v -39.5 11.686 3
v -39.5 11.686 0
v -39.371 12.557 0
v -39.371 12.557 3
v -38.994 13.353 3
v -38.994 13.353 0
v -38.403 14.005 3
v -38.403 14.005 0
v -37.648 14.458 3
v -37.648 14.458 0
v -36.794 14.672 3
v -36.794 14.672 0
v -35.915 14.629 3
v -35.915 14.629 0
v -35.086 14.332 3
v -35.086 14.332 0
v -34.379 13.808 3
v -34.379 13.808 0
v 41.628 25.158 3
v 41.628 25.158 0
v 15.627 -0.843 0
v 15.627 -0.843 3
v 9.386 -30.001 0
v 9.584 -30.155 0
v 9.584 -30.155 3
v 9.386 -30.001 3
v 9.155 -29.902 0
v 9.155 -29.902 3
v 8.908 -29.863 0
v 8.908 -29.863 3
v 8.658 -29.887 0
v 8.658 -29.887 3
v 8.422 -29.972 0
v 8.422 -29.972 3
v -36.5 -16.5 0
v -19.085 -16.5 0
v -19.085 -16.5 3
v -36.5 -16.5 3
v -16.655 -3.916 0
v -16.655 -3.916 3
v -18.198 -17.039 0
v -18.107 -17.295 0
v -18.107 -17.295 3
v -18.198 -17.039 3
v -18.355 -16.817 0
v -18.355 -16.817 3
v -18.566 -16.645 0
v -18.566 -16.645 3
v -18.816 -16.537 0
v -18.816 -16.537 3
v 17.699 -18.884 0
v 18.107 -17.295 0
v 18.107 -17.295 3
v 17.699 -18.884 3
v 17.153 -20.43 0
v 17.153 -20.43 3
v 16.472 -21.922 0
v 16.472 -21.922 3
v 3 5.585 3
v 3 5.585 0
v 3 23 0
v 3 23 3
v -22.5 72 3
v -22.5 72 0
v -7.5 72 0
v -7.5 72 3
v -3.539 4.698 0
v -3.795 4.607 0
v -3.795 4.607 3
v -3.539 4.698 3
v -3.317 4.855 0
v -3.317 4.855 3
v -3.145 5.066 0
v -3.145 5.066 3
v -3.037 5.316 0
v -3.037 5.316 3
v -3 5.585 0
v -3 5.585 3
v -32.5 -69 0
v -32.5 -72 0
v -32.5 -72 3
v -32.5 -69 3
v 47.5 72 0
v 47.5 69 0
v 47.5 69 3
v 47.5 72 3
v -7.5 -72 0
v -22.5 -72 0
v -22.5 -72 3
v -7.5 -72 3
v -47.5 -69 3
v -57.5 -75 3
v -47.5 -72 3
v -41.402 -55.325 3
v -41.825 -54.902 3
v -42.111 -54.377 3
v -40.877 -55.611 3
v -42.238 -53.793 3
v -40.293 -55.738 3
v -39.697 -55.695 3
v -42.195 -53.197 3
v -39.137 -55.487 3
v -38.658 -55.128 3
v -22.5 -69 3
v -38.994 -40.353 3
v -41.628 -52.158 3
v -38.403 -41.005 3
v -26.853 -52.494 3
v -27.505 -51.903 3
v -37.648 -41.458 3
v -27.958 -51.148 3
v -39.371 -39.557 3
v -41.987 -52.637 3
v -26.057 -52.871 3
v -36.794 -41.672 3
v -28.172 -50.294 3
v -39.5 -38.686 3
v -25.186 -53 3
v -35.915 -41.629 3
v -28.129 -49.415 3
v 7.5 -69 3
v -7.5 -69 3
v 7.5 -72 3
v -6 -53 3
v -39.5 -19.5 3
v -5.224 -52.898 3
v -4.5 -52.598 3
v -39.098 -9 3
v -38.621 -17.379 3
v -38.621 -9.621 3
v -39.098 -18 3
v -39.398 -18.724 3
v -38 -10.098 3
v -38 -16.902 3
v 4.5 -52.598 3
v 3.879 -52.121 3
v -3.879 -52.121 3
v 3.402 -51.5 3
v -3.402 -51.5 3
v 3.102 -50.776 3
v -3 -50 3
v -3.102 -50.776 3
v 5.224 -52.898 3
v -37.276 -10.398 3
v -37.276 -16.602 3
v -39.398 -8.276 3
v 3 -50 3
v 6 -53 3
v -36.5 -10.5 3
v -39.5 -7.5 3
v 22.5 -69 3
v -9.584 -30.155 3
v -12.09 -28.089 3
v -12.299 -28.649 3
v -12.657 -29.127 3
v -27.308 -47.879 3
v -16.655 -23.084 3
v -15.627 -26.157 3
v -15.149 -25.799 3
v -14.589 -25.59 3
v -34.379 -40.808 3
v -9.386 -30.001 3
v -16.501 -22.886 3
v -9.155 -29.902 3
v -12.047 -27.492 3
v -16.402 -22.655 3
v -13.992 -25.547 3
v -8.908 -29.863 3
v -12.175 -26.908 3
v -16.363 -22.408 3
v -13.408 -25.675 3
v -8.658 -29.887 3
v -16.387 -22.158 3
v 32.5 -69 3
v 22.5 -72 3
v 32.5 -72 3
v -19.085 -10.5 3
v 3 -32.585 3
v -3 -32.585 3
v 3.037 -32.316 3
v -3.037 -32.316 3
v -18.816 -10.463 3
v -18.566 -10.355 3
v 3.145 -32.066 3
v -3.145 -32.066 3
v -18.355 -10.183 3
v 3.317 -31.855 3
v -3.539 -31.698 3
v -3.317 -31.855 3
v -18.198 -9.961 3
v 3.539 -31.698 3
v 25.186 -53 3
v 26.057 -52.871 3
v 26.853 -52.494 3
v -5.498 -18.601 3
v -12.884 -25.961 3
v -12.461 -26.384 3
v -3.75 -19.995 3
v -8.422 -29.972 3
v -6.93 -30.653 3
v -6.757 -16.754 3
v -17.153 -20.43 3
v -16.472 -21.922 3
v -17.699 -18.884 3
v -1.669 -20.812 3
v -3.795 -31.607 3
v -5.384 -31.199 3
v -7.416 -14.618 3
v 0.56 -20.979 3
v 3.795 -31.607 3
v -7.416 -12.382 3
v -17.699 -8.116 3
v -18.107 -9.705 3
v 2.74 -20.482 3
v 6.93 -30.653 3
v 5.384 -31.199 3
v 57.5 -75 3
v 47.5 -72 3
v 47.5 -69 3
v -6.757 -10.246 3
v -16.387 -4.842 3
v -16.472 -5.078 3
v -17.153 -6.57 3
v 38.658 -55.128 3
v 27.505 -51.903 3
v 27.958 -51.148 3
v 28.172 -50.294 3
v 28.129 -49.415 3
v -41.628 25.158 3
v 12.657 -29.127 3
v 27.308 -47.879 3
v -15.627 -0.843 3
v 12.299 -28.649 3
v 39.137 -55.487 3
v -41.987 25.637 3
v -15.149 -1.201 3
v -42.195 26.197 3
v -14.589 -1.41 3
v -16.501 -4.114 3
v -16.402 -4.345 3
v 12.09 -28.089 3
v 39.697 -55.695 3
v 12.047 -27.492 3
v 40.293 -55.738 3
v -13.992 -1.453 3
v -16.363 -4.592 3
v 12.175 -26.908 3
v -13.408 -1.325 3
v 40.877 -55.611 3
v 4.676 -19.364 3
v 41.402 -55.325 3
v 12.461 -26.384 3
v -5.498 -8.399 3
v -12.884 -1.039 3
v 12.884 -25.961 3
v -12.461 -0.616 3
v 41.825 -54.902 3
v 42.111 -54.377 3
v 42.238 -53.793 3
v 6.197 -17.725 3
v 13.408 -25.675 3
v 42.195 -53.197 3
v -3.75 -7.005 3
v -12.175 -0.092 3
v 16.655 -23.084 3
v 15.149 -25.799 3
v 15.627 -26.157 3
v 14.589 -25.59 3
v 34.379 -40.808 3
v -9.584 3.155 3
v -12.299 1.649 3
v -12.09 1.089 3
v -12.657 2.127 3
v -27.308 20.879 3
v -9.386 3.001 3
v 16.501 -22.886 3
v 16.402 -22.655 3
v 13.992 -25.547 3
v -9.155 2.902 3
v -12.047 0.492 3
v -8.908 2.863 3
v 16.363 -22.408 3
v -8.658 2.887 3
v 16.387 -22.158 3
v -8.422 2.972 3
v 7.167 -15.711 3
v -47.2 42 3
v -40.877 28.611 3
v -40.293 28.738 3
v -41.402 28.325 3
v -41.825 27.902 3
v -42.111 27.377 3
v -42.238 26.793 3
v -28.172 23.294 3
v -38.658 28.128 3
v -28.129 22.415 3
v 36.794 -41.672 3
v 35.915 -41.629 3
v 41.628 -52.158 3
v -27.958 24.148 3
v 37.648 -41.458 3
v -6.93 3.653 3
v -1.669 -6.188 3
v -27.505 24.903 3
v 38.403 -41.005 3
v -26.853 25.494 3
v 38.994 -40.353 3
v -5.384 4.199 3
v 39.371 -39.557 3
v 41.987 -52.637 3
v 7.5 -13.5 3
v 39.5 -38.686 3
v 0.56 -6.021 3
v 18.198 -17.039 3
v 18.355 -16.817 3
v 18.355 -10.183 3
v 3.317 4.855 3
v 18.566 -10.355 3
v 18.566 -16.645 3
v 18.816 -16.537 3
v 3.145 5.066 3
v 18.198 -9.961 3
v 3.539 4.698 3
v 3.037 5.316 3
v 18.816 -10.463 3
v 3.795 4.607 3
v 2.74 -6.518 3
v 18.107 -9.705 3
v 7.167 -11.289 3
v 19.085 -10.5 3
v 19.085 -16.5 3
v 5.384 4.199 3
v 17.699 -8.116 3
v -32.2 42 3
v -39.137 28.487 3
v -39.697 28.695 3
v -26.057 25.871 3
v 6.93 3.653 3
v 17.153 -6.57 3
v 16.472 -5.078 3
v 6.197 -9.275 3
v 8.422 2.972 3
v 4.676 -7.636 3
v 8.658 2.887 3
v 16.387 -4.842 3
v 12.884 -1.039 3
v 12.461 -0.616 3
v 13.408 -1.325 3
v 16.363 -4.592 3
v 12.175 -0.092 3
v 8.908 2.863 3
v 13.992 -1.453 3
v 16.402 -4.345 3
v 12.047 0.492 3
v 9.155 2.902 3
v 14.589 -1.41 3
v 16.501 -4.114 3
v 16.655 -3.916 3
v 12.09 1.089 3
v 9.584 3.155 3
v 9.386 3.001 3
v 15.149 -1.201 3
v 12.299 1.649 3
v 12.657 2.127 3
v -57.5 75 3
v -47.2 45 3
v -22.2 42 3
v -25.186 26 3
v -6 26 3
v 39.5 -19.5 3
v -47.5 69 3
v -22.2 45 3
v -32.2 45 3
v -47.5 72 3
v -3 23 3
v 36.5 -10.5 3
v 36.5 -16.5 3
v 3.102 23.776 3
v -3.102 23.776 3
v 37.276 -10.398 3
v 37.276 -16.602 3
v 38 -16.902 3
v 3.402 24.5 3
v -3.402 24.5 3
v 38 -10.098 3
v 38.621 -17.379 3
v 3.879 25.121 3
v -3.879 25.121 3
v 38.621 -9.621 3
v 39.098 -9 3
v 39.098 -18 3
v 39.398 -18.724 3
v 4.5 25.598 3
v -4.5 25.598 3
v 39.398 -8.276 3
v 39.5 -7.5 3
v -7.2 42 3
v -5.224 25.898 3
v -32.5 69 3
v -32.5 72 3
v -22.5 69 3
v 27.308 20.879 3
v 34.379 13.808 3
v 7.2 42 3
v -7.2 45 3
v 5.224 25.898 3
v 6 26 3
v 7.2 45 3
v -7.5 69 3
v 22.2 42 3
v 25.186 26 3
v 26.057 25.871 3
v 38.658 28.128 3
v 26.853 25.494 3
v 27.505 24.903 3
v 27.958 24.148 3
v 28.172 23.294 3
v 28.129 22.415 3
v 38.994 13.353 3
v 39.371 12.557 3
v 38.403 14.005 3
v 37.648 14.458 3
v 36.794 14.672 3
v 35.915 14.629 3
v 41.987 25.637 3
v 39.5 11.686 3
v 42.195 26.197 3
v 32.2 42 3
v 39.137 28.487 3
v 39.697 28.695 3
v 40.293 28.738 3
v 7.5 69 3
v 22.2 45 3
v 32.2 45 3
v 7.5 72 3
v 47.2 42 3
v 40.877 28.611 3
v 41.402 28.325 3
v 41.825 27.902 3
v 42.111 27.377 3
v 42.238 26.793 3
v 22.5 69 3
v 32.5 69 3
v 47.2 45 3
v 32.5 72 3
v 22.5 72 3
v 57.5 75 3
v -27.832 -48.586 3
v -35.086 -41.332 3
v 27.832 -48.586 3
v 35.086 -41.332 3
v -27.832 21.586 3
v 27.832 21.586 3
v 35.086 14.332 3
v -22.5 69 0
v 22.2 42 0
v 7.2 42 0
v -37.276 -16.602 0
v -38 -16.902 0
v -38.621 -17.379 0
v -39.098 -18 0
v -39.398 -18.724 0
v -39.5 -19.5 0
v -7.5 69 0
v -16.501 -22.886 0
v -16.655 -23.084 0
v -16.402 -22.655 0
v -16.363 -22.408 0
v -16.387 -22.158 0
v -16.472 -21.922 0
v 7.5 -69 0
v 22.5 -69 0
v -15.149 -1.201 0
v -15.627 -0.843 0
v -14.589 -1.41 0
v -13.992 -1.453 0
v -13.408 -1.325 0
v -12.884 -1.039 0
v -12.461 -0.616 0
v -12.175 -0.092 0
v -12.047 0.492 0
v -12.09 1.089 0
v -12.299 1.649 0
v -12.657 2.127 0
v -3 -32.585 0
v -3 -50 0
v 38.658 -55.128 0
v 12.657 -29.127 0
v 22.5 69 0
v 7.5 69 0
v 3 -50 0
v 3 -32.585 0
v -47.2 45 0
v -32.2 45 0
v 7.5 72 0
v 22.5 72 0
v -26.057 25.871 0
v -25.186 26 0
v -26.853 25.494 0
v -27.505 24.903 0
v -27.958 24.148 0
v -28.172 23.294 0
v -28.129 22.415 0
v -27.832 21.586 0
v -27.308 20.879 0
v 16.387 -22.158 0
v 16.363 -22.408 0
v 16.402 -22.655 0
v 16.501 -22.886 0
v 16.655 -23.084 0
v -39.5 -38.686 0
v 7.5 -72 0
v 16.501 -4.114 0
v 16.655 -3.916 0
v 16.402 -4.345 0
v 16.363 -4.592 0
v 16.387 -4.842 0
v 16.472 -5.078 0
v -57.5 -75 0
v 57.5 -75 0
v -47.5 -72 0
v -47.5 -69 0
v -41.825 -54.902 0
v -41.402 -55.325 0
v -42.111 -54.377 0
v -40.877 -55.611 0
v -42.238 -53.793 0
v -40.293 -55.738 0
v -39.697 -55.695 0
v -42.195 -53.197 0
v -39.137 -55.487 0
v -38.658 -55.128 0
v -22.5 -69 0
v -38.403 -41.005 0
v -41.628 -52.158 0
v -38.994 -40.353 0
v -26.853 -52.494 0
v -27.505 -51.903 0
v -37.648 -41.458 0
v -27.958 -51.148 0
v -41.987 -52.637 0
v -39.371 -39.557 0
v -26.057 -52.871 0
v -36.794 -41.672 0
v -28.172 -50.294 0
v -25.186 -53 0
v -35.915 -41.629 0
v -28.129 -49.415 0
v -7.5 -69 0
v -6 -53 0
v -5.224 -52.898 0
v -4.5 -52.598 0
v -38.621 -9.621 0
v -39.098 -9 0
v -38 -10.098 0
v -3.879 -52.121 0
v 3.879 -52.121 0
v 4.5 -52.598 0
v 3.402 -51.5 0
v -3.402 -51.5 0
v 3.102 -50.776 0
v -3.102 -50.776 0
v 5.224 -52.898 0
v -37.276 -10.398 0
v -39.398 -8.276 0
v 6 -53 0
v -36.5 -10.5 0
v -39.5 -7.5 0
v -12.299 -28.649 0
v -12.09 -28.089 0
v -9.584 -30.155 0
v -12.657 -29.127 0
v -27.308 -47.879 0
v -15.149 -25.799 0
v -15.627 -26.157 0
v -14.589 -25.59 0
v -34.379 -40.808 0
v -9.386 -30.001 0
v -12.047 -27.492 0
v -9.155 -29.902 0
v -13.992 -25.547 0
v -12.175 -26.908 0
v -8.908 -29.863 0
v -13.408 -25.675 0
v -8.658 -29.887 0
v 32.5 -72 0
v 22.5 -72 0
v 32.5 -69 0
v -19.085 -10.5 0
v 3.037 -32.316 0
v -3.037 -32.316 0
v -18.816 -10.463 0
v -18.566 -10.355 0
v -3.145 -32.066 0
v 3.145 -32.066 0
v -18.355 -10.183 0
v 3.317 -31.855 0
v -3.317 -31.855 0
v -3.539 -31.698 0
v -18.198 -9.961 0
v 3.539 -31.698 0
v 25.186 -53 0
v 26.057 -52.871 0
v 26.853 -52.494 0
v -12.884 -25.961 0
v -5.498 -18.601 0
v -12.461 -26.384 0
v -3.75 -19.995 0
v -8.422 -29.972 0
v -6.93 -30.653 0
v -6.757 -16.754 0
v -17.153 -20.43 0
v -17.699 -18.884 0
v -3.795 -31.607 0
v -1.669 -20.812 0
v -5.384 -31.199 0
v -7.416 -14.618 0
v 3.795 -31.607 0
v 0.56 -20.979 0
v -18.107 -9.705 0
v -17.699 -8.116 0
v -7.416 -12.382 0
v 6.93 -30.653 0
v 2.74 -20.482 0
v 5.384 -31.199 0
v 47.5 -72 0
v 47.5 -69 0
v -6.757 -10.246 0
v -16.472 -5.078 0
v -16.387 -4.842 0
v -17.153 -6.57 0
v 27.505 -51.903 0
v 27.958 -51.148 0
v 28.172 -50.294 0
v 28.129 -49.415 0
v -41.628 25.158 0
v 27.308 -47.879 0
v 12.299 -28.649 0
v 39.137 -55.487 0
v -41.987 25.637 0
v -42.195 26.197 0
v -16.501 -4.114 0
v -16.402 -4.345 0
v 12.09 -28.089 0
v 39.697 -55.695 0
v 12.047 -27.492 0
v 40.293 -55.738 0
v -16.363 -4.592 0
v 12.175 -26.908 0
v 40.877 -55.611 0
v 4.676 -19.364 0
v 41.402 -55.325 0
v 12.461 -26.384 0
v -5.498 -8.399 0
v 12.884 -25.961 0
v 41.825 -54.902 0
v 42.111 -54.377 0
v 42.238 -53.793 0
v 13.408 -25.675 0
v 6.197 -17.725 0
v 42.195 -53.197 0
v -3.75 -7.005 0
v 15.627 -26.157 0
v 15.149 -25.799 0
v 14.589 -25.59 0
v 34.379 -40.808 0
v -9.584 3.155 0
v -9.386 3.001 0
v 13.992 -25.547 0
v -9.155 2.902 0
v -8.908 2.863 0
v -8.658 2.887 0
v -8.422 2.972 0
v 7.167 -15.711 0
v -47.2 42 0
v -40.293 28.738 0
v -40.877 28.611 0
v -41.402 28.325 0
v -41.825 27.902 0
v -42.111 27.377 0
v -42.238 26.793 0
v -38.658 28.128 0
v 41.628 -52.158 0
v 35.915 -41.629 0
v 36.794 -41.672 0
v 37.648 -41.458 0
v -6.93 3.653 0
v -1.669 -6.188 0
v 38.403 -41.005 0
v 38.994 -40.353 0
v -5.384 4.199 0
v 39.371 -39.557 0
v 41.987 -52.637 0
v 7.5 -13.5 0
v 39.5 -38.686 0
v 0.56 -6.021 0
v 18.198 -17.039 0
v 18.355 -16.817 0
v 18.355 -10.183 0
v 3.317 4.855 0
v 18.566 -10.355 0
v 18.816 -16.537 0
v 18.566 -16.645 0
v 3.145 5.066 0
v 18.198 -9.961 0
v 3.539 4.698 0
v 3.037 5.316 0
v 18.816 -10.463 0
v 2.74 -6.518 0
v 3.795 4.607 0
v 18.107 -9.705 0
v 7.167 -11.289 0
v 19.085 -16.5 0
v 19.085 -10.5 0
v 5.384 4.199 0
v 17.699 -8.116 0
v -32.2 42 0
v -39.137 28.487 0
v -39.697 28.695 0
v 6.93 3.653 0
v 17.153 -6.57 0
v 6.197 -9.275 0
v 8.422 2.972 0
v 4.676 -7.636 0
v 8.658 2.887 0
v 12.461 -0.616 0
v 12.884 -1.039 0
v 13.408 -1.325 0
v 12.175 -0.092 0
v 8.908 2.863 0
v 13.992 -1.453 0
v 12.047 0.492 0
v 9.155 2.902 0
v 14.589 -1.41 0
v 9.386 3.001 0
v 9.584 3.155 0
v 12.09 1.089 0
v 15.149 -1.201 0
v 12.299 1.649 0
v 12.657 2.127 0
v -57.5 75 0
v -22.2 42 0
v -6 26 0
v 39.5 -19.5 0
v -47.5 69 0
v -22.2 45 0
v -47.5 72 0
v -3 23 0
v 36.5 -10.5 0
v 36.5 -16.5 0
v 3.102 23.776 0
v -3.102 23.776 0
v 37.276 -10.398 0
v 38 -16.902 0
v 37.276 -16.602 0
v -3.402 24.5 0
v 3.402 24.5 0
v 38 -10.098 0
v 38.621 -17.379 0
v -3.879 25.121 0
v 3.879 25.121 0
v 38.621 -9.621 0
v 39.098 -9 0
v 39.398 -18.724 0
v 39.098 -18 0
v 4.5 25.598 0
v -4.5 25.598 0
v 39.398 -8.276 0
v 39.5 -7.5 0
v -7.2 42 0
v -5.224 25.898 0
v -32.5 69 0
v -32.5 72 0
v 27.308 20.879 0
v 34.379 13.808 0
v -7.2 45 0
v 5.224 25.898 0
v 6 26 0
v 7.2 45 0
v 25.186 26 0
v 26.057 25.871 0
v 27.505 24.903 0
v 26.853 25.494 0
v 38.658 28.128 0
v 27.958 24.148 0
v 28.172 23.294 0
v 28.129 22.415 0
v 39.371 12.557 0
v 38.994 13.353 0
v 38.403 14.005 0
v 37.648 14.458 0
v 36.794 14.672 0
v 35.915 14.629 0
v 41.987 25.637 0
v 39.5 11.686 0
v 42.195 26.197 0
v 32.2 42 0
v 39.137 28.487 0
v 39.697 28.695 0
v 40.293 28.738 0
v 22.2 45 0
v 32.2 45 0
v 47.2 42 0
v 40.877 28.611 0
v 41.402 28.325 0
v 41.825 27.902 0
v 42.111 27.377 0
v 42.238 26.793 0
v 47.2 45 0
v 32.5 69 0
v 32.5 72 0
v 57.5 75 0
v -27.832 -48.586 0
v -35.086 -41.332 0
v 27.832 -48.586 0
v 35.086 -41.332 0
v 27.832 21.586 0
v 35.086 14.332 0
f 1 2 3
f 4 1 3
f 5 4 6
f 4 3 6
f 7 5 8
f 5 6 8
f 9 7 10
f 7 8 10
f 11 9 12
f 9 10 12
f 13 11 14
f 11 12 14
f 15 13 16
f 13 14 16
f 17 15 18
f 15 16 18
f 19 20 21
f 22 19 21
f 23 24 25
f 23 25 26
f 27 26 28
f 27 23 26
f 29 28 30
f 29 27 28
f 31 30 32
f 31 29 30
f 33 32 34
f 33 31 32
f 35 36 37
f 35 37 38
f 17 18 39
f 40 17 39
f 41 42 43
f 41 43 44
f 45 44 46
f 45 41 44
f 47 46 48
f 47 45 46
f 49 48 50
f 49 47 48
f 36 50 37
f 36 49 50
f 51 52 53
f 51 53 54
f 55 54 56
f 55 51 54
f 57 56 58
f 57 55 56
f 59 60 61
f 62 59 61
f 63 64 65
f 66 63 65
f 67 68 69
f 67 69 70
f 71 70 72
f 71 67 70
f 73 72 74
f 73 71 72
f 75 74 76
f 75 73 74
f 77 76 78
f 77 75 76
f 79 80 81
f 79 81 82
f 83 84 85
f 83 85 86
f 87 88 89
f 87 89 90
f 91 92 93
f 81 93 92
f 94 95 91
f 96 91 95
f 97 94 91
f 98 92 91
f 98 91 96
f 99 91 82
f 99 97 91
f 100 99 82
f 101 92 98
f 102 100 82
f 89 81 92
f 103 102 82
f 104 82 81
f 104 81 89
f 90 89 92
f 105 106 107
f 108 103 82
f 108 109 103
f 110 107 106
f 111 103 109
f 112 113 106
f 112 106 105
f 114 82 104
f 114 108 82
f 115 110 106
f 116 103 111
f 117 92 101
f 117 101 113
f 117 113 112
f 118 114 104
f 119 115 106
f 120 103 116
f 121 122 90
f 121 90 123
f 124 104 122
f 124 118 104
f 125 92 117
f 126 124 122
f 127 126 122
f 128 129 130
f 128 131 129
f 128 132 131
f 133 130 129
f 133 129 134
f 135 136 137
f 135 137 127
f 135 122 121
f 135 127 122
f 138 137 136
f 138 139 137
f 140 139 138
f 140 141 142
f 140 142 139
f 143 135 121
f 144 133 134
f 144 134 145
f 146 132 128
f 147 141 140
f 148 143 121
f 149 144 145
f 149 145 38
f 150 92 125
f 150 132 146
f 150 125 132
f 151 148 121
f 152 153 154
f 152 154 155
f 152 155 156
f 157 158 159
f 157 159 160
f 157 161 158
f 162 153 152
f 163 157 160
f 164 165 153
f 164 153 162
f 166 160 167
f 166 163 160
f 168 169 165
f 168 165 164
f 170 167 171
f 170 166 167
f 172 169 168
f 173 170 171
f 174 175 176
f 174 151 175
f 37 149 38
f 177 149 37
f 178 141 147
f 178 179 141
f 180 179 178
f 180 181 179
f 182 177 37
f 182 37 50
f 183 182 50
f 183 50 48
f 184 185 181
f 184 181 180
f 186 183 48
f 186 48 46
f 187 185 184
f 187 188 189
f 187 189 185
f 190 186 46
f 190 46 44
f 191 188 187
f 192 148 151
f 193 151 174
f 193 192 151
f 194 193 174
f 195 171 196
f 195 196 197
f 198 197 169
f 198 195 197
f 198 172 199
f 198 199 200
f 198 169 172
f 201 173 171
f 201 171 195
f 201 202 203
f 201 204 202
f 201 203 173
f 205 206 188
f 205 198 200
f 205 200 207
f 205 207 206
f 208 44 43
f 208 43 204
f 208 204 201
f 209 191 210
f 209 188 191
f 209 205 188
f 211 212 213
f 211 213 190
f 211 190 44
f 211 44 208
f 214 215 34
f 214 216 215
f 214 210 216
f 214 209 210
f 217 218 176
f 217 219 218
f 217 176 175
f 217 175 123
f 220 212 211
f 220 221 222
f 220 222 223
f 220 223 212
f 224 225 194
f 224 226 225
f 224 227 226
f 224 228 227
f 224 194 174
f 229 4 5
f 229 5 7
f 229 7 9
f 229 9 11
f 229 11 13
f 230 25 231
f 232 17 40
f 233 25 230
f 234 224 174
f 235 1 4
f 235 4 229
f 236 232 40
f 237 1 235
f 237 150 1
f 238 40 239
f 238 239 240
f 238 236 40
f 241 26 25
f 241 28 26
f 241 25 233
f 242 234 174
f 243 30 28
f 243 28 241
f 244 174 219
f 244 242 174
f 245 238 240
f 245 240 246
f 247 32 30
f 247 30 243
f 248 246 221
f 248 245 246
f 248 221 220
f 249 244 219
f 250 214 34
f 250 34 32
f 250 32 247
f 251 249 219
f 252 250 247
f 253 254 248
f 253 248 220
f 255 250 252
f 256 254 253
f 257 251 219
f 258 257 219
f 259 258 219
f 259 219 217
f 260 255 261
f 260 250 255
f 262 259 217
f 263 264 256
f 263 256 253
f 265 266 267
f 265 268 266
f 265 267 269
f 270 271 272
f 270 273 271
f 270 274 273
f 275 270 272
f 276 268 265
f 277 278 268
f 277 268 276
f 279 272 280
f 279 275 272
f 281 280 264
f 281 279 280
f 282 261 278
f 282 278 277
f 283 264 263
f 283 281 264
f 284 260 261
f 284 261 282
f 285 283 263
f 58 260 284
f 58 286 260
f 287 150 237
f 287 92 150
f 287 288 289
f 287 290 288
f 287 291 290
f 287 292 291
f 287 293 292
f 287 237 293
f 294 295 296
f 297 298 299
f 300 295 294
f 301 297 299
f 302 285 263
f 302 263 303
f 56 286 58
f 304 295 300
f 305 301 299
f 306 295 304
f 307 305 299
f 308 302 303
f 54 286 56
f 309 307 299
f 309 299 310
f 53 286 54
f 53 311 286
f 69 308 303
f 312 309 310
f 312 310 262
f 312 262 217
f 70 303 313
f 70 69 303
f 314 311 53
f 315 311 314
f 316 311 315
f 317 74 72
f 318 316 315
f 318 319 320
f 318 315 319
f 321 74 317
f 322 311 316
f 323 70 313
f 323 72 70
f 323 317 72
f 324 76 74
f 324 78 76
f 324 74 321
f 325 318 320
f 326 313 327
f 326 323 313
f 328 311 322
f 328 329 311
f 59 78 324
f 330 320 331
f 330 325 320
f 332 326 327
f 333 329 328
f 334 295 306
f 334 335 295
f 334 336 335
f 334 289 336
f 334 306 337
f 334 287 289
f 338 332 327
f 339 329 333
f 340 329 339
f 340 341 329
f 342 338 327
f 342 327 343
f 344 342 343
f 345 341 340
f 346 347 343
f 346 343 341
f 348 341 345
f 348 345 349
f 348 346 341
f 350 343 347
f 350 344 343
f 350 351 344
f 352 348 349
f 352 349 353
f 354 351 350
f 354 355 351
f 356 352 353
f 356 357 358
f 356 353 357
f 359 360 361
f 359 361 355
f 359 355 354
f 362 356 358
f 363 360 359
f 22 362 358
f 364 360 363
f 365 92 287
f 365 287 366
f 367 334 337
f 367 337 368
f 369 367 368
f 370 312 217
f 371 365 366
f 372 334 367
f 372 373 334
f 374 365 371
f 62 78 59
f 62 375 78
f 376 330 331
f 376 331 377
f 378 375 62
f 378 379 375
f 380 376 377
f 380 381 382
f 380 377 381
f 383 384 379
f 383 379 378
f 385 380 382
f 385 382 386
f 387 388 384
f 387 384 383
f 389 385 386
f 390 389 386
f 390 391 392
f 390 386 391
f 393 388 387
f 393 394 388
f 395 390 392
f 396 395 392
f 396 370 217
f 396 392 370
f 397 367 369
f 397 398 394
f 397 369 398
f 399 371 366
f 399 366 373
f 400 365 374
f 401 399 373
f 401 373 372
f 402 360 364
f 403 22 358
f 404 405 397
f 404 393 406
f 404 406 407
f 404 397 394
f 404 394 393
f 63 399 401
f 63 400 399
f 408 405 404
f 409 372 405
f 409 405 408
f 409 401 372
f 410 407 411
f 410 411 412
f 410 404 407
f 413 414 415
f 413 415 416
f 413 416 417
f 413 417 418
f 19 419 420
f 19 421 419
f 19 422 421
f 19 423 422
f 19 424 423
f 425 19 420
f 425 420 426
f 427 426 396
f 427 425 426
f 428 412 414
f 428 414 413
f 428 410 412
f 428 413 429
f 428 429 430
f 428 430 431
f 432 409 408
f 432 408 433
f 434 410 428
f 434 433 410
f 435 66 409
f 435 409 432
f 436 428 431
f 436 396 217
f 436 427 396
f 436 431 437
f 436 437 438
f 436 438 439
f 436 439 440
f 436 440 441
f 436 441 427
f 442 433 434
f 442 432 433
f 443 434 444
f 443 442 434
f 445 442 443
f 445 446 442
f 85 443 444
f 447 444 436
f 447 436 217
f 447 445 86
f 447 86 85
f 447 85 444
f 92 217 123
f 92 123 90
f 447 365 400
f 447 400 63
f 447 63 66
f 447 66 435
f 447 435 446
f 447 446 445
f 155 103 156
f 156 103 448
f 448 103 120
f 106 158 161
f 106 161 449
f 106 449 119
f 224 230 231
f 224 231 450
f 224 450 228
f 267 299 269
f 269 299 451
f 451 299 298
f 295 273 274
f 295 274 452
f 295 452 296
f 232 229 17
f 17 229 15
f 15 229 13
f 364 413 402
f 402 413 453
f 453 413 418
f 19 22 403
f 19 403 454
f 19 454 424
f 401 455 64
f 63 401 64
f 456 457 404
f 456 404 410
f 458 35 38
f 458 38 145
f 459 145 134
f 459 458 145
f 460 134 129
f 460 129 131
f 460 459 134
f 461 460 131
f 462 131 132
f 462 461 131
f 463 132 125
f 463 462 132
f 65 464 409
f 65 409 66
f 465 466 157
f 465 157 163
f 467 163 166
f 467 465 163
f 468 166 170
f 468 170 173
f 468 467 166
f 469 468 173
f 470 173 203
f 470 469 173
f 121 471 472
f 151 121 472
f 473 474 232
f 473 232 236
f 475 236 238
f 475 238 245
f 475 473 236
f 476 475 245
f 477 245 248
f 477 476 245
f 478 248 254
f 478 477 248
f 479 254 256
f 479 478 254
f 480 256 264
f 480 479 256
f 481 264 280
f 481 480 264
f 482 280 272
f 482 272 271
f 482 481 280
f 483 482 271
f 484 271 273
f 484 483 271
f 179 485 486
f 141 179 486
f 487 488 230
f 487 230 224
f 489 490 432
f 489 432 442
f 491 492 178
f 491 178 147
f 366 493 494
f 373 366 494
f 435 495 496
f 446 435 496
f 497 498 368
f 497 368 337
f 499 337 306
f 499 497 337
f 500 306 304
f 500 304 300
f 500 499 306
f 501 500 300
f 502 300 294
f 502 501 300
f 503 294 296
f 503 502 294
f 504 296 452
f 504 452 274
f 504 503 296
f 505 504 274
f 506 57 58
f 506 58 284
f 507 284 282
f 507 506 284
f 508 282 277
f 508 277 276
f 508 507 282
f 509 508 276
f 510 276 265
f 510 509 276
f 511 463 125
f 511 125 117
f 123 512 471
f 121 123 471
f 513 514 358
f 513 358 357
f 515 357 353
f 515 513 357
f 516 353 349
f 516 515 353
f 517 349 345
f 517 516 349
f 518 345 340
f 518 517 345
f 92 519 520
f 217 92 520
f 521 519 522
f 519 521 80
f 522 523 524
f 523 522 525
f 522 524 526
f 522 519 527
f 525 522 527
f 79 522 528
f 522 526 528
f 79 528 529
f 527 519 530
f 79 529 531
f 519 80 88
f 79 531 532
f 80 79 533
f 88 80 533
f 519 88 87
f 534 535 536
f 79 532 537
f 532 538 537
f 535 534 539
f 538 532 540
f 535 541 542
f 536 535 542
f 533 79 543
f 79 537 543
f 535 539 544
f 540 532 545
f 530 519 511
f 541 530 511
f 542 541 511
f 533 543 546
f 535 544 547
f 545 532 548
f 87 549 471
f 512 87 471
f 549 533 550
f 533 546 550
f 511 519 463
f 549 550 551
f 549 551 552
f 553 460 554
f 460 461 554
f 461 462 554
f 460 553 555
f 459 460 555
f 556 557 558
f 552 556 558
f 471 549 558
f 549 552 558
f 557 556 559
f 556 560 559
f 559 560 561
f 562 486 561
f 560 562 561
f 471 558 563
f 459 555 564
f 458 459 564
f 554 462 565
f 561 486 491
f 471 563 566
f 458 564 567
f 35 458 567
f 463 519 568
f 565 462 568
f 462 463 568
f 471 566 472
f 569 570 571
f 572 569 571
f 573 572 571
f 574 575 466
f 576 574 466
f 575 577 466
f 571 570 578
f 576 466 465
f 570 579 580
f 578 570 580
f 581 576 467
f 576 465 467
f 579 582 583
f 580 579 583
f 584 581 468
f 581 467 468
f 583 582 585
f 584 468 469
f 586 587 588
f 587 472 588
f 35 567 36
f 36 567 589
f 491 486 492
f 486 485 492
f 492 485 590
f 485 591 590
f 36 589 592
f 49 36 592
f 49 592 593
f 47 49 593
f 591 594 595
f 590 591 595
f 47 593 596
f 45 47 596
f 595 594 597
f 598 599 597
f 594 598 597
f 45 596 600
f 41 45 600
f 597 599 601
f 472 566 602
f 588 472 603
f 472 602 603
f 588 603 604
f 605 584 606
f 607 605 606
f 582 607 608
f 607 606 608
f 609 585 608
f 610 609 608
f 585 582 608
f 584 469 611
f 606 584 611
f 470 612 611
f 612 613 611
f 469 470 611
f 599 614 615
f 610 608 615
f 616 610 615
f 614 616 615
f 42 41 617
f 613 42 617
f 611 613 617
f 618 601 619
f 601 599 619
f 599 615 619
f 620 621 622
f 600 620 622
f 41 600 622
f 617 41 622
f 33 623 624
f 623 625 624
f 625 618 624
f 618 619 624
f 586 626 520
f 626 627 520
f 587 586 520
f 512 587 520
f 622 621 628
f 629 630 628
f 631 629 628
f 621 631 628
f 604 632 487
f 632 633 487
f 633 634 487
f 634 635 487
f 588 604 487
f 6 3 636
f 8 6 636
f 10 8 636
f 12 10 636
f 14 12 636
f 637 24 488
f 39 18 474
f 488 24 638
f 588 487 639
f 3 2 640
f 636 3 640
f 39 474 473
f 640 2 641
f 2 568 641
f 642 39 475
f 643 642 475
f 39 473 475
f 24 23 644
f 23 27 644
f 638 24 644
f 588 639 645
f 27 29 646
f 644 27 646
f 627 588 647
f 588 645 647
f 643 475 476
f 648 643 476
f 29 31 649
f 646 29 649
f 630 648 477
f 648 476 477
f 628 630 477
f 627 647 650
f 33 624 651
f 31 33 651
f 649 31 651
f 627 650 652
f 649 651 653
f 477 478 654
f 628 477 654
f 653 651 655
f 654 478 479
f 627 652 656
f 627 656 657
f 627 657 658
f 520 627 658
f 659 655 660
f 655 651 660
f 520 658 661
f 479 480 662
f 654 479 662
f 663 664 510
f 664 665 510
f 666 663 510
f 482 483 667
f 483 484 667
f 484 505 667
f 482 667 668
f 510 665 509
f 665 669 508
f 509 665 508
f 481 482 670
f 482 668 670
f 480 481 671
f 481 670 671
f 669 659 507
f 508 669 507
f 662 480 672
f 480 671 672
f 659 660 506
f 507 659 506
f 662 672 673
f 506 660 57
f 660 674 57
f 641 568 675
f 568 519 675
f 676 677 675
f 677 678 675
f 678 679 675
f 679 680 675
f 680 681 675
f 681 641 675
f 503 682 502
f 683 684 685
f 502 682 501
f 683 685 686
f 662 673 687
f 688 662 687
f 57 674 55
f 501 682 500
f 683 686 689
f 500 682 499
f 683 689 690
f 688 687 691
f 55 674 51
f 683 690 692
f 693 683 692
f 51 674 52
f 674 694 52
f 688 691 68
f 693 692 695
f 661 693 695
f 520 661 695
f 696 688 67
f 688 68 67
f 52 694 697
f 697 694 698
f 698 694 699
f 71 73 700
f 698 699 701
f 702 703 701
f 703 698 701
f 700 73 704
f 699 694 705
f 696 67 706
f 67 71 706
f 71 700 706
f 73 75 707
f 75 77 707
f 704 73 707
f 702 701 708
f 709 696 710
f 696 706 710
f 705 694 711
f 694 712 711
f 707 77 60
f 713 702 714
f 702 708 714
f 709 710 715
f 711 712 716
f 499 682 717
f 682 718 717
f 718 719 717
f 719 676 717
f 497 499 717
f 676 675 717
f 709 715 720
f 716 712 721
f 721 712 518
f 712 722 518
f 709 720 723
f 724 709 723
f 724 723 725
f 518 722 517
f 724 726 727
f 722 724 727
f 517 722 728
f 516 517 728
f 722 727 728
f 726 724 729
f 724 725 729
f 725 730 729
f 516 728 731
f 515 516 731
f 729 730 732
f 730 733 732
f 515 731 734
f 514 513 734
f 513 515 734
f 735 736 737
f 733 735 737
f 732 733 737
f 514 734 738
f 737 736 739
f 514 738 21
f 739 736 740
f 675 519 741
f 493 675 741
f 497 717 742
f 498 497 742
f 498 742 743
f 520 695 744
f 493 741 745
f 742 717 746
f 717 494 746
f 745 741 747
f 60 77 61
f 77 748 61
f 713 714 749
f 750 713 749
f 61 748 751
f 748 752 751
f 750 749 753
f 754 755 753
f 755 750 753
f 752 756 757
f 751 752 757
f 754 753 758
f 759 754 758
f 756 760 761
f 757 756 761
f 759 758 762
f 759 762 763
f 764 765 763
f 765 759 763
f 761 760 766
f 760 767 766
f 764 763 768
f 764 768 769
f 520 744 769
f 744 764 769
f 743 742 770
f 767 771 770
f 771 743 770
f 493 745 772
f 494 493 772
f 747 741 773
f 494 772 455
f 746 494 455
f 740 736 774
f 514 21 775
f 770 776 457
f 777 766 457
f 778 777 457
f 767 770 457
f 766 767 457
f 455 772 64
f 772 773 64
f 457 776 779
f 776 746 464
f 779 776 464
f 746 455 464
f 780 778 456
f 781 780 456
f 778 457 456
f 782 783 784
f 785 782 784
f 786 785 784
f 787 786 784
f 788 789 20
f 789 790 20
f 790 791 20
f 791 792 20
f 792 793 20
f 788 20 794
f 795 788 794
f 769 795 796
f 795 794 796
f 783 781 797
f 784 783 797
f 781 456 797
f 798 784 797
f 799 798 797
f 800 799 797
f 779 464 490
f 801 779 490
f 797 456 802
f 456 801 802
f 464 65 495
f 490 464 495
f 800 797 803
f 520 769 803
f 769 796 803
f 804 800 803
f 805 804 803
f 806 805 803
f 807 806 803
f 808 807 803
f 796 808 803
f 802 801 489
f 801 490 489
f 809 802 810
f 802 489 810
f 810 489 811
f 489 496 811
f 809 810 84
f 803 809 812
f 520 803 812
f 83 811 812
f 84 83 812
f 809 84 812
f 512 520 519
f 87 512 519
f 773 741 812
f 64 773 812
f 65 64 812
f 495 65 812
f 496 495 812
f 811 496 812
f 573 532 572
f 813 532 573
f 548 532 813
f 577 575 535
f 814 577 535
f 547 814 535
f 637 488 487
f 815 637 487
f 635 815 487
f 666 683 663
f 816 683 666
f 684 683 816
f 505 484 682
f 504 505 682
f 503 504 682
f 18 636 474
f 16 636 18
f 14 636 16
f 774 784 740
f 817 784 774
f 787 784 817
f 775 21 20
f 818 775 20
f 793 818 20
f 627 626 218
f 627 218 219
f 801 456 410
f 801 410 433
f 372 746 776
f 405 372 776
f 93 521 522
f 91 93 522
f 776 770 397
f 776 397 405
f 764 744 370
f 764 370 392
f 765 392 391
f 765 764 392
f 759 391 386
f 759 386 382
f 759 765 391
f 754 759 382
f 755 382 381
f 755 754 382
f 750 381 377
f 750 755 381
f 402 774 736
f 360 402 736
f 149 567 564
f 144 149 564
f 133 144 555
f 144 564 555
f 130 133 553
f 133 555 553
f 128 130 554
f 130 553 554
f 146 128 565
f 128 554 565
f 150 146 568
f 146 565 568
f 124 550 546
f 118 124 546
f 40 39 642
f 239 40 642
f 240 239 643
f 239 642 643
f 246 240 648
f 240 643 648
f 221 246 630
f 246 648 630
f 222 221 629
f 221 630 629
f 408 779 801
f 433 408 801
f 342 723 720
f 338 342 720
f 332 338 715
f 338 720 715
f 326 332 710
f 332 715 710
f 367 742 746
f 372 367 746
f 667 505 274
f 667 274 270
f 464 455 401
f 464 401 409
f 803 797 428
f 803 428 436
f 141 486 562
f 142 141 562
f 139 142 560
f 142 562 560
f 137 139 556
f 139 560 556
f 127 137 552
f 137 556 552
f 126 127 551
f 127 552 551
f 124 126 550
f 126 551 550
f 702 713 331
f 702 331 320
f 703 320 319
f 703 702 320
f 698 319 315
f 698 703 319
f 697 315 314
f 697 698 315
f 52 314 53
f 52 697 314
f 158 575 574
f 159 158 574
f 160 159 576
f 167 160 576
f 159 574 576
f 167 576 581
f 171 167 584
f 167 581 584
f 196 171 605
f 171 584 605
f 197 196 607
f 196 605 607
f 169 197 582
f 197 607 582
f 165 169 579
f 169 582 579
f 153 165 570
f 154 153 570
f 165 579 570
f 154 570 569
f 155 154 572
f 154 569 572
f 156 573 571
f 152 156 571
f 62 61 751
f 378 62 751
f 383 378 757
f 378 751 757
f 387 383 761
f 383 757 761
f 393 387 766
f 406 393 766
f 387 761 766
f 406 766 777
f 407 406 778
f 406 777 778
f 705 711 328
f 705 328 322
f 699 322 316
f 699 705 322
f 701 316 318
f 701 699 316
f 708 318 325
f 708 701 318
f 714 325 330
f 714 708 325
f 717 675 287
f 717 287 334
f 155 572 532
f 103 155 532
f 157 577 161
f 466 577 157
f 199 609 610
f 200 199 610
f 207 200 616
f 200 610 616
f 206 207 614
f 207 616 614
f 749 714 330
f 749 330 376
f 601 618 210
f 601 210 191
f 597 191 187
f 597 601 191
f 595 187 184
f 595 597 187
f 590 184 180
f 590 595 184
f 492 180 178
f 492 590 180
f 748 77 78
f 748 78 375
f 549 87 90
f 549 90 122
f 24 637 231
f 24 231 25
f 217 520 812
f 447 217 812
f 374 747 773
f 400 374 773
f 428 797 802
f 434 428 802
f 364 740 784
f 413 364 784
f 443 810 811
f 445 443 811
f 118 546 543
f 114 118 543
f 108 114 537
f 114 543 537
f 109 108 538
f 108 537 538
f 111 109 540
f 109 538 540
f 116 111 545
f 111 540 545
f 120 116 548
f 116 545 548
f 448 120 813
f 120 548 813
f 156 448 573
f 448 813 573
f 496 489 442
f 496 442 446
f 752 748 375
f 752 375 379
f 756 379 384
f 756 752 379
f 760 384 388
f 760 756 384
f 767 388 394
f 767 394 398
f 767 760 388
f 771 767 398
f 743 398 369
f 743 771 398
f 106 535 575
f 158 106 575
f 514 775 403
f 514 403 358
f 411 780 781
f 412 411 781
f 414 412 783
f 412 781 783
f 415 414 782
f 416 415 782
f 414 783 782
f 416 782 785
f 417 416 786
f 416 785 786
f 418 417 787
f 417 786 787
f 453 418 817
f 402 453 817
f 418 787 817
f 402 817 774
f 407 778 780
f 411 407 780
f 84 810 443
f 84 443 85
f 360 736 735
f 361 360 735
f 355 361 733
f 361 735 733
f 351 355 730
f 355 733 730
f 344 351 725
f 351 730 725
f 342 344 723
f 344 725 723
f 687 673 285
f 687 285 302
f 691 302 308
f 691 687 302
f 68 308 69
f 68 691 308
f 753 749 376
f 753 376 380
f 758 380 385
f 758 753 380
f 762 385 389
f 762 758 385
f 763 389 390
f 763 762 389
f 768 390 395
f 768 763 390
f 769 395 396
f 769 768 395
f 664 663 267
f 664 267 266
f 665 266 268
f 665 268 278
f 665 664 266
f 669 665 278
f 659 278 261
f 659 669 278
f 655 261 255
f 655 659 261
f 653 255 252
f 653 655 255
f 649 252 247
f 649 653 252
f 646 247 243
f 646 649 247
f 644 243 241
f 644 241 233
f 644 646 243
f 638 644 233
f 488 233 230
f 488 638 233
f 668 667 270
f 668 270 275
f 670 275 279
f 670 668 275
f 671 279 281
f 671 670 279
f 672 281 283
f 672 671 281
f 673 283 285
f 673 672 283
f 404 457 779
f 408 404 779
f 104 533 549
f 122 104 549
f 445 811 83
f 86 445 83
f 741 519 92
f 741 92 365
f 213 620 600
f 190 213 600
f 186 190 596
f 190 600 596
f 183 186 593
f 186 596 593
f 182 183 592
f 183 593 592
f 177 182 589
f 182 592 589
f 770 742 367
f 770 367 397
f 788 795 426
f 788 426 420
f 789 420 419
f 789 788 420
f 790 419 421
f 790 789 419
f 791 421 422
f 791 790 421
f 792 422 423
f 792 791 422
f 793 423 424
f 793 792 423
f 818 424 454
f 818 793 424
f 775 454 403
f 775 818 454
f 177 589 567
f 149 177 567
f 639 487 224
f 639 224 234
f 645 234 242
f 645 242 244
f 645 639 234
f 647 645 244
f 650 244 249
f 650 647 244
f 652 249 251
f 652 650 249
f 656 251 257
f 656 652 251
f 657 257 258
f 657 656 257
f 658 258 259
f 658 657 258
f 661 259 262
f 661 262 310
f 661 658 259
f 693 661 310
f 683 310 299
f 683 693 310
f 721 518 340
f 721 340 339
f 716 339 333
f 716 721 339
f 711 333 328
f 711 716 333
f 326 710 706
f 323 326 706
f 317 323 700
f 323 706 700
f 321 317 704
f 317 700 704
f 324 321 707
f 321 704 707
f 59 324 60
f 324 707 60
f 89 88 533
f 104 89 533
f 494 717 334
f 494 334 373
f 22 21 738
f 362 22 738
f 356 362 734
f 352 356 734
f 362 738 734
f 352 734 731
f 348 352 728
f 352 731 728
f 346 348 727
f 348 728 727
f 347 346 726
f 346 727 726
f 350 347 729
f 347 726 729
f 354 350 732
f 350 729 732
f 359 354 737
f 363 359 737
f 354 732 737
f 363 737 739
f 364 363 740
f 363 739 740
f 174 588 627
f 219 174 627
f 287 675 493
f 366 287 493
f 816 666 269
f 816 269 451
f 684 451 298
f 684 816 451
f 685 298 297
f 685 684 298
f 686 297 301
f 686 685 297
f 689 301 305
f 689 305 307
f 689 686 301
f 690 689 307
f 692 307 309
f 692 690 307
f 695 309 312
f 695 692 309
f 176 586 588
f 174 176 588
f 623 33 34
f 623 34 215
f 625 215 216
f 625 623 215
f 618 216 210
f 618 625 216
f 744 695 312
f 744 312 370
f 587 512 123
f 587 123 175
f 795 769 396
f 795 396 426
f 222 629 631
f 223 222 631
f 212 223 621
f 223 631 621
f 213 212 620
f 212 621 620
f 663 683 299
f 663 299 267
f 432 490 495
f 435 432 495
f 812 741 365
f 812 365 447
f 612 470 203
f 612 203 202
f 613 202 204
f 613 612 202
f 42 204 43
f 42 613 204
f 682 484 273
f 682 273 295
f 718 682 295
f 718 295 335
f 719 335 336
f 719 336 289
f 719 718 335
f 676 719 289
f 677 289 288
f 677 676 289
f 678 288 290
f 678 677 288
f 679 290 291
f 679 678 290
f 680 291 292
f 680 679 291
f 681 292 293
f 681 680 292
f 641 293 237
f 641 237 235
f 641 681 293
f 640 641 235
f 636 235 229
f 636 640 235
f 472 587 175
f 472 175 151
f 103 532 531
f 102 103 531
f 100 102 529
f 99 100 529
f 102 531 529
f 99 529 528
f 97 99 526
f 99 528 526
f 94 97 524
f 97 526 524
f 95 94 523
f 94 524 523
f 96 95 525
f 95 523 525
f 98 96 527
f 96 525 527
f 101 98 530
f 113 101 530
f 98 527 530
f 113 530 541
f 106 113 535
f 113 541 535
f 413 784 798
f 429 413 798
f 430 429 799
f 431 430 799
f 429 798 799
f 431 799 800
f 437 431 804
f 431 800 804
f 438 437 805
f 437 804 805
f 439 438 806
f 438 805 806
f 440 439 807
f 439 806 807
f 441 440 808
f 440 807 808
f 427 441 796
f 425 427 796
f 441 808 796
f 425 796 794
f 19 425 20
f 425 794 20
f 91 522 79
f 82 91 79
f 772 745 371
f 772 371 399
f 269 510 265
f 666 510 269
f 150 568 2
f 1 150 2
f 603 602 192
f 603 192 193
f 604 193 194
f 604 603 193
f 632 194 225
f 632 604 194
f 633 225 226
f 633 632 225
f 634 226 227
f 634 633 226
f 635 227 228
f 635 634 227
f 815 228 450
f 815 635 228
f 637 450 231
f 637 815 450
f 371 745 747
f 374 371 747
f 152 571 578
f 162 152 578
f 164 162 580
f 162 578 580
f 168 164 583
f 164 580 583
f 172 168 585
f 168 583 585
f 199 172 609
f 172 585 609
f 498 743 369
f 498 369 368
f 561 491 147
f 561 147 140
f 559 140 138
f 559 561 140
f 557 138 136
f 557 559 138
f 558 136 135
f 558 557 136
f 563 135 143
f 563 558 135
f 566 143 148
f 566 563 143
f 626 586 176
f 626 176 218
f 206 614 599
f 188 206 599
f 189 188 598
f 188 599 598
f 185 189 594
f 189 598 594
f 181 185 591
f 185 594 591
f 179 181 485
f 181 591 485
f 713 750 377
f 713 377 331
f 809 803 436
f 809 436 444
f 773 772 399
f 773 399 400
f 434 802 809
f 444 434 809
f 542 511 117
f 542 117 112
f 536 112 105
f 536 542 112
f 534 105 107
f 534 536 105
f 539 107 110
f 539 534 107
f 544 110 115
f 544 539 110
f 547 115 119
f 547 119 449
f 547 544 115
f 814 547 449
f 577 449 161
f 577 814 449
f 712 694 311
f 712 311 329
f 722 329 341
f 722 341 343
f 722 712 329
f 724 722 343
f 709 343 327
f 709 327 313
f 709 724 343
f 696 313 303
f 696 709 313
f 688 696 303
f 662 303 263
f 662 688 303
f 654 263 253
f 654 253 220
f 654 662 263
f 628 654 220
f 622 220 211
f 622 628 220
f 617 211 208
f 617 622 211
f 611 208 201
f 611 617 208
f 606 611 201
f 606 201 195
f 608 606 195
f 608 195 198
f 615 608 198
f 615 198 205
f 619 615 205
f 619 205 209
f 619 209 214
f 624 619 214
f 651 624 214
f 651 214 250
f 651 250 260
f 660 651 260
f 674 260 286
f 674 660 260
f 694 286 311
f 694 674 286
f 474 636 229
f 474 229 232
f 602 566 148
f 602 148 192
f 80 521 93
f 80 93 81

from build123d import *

# Parameters (mm, degrees)
SKETCH1_W           = 115
SKETCH1_H           = 150
SKETCH1_R           = 7.5
SKETCH1_W_2         = 15
SKETCH1_H_2         = 3
BOSS_EXTRUDE1_DEPTH = 3


with BuildPart() as part:
    # Sketch1 → Boss-Extrude1 (new body)
    with BuildSketch(Plane.XY):
        Rectangle(SKETCH1_W, SKETCH1_H)
        with Locations((0, -13.5)):
            Circle(SKETCH1_R, mode=Mode.SUBTRACT)
        with Locations((15, 70.5)):
            Rectangle(SKETCH1_W_2, SKETCH1_H_2, mode=Mode.SUBTRACT)
        with Locations((-40, 70.5)):
            Rectangle(SKETCH1_W_2, SKETCH1_H_2, mode=Mode.SUBTRACT)
        with Locations((-15, 70.5)):
            Rectangle(SKETCH1_W_2, SKETCH1_H_2, mode=Mode.SUBTRACT)
        with Locations((40, 70.5)):
            Rectangle(SKETCH1_W_2, SKETCH1_H_2, mode=Mode.SUBTRACT)
        with Locations((40, -70.5)):
            Rectangle(SKETCH1_W_2, SKETCH1_H_2, mode=Mode.SUBTRACT)
        with Locations((15, -70.5)):
            Rectangle(SKETCH1_W_2, SKETCH1_H_2, mode=Mode.SUBTRACT)
        with Locations((-15, -70.5)):
            Rectangle(SKETCH1_W_2, SKETCH1_H_2, mode=Mode.SUBTRACT)
        with Locations((-40, -70.5)):
            Rectangle(SKETCH1_W_2, SKETCH1_H_2, mode=Mode.SUBTRACT)
        with Locations((14.7, 43.5)):
            Rectangle(SKETCH1_W_2, SKETCH1_H_2, mode=Mode.SUBTRACT)
        with Locations((-39.7, 43.5)):
            Rectangle(SKETCH1_W_2, SKETCH1_H_2, mode=Mode.SUBTRACT)
        with Locations((-14.7, 43.5)):
            Rectangle(SKETCH1_W_2, SKETCH1_H_2, mode=Mode.SUBTRACT)
        with Locations((39.7, 43.5)):
            Rectangle(SKETCH1_W_2, SKETCH1_H_2, mode=Mode.SUBTRACT)
        with BuildLine():
            Line((39.5, -7.5), (39.5, 11.686291501))
            ThreePointArc((39.5, 11.686291501), (37.648050297, 14.457930099), (34.378679656, 13.807611845))
            Line((34.378679656, 13.807611845), (16.655175669, -3.915892143))
            ThreePointArc((16.655175669, -3.915892143), (16.374485428, -4.467252196), (16.471908992, -5.078229748))
            ThreePointArc((16.471908992, -5.078229748), (17.443347183, -7.33723771), (18.106599572, -9.705128205))
            ThreePointArc((18.106599572, -9.705128205), (18.454909512, -10.276250026), (19.085334684, -10.5))
            Line((19.085334684, -10.5), (36.5, -10.5))
            ThreePointArc((36.5, -10.5), (38.621320344, -9.621320344), (39.5, -7.5))
        make_face(mode=Mode.SUBTRACT)
        with BuildLine():
            Line((3, -32.585334684), (3, -50))
            ThreePointArc((3, -50), (3.878679656, -52.121320344), (6, -53))
            Line((6, -53), (25.186291501, -53))
            ThreePointArc((25.186291501, -53), (27.957930099, -51.148050297), (27.307611845, -47.878679656))
            Line((27.307611845, -47.878679656), (9.584107857, -30.155175669))
            ThreePointArc((9.584107857, -30.155175669), (9.032747804, -29.874485428), (8.421770252, -29.971908992))
            ThreePointArc((8.421770252, -29.971908992), (6.16276229, -30.943347183), (3.794871795, -31.606599572))
            ThreePointArc((3.794871795, -31.606599572), (3.223749974, -31.954909512), (3, -32.585334684))
        make_face(mode=Mode.SUBTRACT)
        with BuildLine():
            Line((16.655175669, -23.084107857), (34.378679656, -40.807611845))
            ThreePointArc((34.378679656, -40.807611845), (37.648050297, -41.457930099), (39.5, -38.686291501))
            Line((39.5, -38.686291501), (39.5, -19.5))
            ThreePointArc((39.5, -19.5), (38.621320344, -17.378679656), (36.5, -16.5))
            Line((36.5, -16.5), (19.085334684, -16.5))
            ThreePointArc((19.085334684, -16.5), (18.454909512, -16.723749974), (18.106599572, -17.294871795))
            ThreePointArc((18.106599572, -17.294871795), (17.443347183, -19.66276229), (16.471908992, -21.921770252))
            ThreePointArc((16.471908992, -21.921770252), (16.374485428, -22.532747804), (16.655175669, -23.084107857))
        make_face(mode=Mode.SUBTRACT)
        with BuildLine():
            Line((6, 26), (25.186291501, 26))
            ThreePointArc((25.186291501, 26), (27.957930099, 24.148050297), (27.307611845, 20.878679656))
            Line((27.307611845, 20.878679656), (9.584107857, 3.155175669))
            ThreePointArc((9.584107857, 3.155175669), (9.032747804, 2.874485428), (8.421770252, 2.971908992))
            ThreePointArc((8.421770252, 2.971908992), (6.16276229, 3.943347183), (3.794871795, 4.606599572))
            ThreePointArc((3.794871795, 4.606599572), (3.223749974, 4.954909512), (3, 5.585334684))
            Line((3, 5.585334684), (3, 23))
            ThreePointArc((3, 23), (3.878679656, 25.121320344), (6, 26))
        make_face(mode=Mode.SUBTRACT)
        with BuildLine():
            Line((-3, 5.585334684), (-3, 23))
            ThreePointArc((-3, 23), (-3.878679656, 25.121320344), (-6, 26))
            Line((-6, 26), (-25.186291501, 26))
            ThreePointArc((-25.186291501, 26), (-27.957930099, 24.148050297), (-27.307611845, 20.878679656))
            Line((-27.307611845, 20.878679656), (-9.584107857, 3.155175669))
            ThreePointArc((-9.584107857, 3.155175669), (-9.032747804, 2.874485428), (-8.421770252, 2.971908992))
            ThreePointArc((-8.421770252, 2.971908992), (-6.16276229, 3.943347183), (-3.794871795, 4.606599572))
            ThreePointArc((-3.794871795, 4.606599572), (-3.223749974, 4.954909512), (-3, 5.585334684))
        make_face(mode=Mode.SUBTRACT)
        with BuildLine():
            Line((-39.5, -7.5), (-39.5, 11.686291501))
            ThreePointArc((-39.5, 11.686291501), (-37.648050297, 14.457930099), (-34.378679656, 13.807611845))
            Line((-34.378679656, 13.807611845), (-16.655175669, -3.915892143))
            ThreePointArc((-16.655175669, -3.915892143), (-16.374485428, -4.467252196), (-16.471908992, -5.078229748))
            ThreePointArc((-16.471908992, -5.078229748), (-17.443347183, -7.33723771), (-18.106599572, -9.705128205))
            ThreePointArc((-18.106599572, -9.705128205), (-18.454909512, -10.276250026), (-19.085334684, -10.5))
            Line((-19.085334684, -10.5), (-36.5, -10.5))
            ThreePointArc((-36.5, -10.5), (-38.621320344, -9.621320344), (-39.5, -7.5))
        make_face(mode=Mode.SUBTRACT)
        with BuildLine():
            Line((-19.085334684, -16.5), (-36.5, -16.5))
            ThreePointArc((-36.5, -16.5), (-38.621320344, -17.378679656), (-39.5, -19.5))
            Line((-39.5, -19.5), (-39.5, -38.686291501))
            ThreePointArc((-39.5, -38.686291501), (-37.648050297, -41.457930099), (-34.378679656, -40.807611845))
            Line((-34.378679656, -40.807611845), (-16.655175669, -23.084107857))
            ThreePointArc((-16.655175669, -23.084107857), (-16.374485428, -22.532747804), (-16.471908992, -21.921770252))
            ThreePointArc((-16.471908992, -21.921770252), (-17.443347183, -19.66276229), (-18.106599572, -17.294871795))
            ThreePointArc((-18.106599572, -17.294871795), (-18.454909512, -16.723749974), (-19.085334684, -16.5))
        make_face(mode=Mode.SUBTRACT)
        with BuildLine():
            Line((-3, -32.585334684), (-3, -50))
            ThreePointArc((-3, -50), (-3.878679656, -52.121320344), (-6, -53))
            Line((-6, -53), (-25.186291501, -53))
            ThreePointArc((-25.186291501, -53), (-27.957930099, -51.148050297), (-27.307611845, -47.878679656))
            Line((-27.307611845, -47.878679656), (-9.584107857, -30.155175669))
            ThreePointArc((-9.584107857, -30.155175669), (-9.032747804, -29.874485428), (-8.421770252, -29.971908992))
            ThreePointArc((-8.421770252, -29.971908992), (-6.16276229, -30.943347183), (-3.794871795, -31.606599572))
            ThreePointArc((-3.794871795, -31.606599572), (-3.223749974, -31.954909512), (-3, -32.585334684))
        make_face(mode=Mode.SUBTRACT)
        with BuildLine():
            Line((12.657211383, 2.127059864), (38.658474042, 28.128322523))
            ThreePointArc((38.658474042, 28.128322523), (41.628322523, 28.128322523), (41.628322523, 25.158474042))
            Line((41.628322523, 25.158474042), (15.627059864, -0.842788617))
            ThreePointArc((15.627059864, -0.842788617), (12.657211383, -0.842788617), (12.657211383, 2.127059864))
        make_face(mode=Mode.SUBTRACT)
        with BuildLine():
            Line((12.657211383, -29.127059864), (38.658474042, -55.128322523))
            ThreePointArc((38.658474042, -55.128322523), (41.628322523, -55.128322523), (41.628322523, -52.158474042))
            Line((41.628322523, -52.158474042), (15.627059864, -26.157211383))
            ThreePointArc((15.627059864, -26.157211383), (12.657211383, -26.157211383), (12.657211383, -29.127059864))
        make_face(mode=Mode.SUBTRACT)
        with BuildLine():
            Line((-12.657211383, -29.127059864), (-38.658474042, -55.128322523))
            ThreePointArc((-38.658474042, -55.128322523), (-41.628322523, -55.128322523), (-41.628322523, -52.158474042))
            Line((-41.628322523, -52.158474042), (-15.627059864, -26.157211383))
            ThreePointArc((-15.627059864, -26.157211383), (-12.657211383, -26.157211383), (-12.657211383, -29.127059864))
        make_face(mode=Mode.SUBTRACT)
        with BuildLine():
            Line((-12.657211383, 2.127059864), (-38.658474042, 28.128322523))
            ThreePointArc((-38.658474042, 28.128322523), (-41.628322523, 28.128322523), (-41.628322523, 25.158474042))
            Line((-41.628322523, 25.158474042), (-15.627059864, -0.842788617))
            ThreePointArc((-15.627059864, -0.842788617), (-12.657211383, -0.842788617), (-12.657211383, 2.127059864))
        make_face(mode=Mode.SUBTRACT)
    extrude(amount=BOSS_EXTRUDE1_DEPTH)


solid = part.part
